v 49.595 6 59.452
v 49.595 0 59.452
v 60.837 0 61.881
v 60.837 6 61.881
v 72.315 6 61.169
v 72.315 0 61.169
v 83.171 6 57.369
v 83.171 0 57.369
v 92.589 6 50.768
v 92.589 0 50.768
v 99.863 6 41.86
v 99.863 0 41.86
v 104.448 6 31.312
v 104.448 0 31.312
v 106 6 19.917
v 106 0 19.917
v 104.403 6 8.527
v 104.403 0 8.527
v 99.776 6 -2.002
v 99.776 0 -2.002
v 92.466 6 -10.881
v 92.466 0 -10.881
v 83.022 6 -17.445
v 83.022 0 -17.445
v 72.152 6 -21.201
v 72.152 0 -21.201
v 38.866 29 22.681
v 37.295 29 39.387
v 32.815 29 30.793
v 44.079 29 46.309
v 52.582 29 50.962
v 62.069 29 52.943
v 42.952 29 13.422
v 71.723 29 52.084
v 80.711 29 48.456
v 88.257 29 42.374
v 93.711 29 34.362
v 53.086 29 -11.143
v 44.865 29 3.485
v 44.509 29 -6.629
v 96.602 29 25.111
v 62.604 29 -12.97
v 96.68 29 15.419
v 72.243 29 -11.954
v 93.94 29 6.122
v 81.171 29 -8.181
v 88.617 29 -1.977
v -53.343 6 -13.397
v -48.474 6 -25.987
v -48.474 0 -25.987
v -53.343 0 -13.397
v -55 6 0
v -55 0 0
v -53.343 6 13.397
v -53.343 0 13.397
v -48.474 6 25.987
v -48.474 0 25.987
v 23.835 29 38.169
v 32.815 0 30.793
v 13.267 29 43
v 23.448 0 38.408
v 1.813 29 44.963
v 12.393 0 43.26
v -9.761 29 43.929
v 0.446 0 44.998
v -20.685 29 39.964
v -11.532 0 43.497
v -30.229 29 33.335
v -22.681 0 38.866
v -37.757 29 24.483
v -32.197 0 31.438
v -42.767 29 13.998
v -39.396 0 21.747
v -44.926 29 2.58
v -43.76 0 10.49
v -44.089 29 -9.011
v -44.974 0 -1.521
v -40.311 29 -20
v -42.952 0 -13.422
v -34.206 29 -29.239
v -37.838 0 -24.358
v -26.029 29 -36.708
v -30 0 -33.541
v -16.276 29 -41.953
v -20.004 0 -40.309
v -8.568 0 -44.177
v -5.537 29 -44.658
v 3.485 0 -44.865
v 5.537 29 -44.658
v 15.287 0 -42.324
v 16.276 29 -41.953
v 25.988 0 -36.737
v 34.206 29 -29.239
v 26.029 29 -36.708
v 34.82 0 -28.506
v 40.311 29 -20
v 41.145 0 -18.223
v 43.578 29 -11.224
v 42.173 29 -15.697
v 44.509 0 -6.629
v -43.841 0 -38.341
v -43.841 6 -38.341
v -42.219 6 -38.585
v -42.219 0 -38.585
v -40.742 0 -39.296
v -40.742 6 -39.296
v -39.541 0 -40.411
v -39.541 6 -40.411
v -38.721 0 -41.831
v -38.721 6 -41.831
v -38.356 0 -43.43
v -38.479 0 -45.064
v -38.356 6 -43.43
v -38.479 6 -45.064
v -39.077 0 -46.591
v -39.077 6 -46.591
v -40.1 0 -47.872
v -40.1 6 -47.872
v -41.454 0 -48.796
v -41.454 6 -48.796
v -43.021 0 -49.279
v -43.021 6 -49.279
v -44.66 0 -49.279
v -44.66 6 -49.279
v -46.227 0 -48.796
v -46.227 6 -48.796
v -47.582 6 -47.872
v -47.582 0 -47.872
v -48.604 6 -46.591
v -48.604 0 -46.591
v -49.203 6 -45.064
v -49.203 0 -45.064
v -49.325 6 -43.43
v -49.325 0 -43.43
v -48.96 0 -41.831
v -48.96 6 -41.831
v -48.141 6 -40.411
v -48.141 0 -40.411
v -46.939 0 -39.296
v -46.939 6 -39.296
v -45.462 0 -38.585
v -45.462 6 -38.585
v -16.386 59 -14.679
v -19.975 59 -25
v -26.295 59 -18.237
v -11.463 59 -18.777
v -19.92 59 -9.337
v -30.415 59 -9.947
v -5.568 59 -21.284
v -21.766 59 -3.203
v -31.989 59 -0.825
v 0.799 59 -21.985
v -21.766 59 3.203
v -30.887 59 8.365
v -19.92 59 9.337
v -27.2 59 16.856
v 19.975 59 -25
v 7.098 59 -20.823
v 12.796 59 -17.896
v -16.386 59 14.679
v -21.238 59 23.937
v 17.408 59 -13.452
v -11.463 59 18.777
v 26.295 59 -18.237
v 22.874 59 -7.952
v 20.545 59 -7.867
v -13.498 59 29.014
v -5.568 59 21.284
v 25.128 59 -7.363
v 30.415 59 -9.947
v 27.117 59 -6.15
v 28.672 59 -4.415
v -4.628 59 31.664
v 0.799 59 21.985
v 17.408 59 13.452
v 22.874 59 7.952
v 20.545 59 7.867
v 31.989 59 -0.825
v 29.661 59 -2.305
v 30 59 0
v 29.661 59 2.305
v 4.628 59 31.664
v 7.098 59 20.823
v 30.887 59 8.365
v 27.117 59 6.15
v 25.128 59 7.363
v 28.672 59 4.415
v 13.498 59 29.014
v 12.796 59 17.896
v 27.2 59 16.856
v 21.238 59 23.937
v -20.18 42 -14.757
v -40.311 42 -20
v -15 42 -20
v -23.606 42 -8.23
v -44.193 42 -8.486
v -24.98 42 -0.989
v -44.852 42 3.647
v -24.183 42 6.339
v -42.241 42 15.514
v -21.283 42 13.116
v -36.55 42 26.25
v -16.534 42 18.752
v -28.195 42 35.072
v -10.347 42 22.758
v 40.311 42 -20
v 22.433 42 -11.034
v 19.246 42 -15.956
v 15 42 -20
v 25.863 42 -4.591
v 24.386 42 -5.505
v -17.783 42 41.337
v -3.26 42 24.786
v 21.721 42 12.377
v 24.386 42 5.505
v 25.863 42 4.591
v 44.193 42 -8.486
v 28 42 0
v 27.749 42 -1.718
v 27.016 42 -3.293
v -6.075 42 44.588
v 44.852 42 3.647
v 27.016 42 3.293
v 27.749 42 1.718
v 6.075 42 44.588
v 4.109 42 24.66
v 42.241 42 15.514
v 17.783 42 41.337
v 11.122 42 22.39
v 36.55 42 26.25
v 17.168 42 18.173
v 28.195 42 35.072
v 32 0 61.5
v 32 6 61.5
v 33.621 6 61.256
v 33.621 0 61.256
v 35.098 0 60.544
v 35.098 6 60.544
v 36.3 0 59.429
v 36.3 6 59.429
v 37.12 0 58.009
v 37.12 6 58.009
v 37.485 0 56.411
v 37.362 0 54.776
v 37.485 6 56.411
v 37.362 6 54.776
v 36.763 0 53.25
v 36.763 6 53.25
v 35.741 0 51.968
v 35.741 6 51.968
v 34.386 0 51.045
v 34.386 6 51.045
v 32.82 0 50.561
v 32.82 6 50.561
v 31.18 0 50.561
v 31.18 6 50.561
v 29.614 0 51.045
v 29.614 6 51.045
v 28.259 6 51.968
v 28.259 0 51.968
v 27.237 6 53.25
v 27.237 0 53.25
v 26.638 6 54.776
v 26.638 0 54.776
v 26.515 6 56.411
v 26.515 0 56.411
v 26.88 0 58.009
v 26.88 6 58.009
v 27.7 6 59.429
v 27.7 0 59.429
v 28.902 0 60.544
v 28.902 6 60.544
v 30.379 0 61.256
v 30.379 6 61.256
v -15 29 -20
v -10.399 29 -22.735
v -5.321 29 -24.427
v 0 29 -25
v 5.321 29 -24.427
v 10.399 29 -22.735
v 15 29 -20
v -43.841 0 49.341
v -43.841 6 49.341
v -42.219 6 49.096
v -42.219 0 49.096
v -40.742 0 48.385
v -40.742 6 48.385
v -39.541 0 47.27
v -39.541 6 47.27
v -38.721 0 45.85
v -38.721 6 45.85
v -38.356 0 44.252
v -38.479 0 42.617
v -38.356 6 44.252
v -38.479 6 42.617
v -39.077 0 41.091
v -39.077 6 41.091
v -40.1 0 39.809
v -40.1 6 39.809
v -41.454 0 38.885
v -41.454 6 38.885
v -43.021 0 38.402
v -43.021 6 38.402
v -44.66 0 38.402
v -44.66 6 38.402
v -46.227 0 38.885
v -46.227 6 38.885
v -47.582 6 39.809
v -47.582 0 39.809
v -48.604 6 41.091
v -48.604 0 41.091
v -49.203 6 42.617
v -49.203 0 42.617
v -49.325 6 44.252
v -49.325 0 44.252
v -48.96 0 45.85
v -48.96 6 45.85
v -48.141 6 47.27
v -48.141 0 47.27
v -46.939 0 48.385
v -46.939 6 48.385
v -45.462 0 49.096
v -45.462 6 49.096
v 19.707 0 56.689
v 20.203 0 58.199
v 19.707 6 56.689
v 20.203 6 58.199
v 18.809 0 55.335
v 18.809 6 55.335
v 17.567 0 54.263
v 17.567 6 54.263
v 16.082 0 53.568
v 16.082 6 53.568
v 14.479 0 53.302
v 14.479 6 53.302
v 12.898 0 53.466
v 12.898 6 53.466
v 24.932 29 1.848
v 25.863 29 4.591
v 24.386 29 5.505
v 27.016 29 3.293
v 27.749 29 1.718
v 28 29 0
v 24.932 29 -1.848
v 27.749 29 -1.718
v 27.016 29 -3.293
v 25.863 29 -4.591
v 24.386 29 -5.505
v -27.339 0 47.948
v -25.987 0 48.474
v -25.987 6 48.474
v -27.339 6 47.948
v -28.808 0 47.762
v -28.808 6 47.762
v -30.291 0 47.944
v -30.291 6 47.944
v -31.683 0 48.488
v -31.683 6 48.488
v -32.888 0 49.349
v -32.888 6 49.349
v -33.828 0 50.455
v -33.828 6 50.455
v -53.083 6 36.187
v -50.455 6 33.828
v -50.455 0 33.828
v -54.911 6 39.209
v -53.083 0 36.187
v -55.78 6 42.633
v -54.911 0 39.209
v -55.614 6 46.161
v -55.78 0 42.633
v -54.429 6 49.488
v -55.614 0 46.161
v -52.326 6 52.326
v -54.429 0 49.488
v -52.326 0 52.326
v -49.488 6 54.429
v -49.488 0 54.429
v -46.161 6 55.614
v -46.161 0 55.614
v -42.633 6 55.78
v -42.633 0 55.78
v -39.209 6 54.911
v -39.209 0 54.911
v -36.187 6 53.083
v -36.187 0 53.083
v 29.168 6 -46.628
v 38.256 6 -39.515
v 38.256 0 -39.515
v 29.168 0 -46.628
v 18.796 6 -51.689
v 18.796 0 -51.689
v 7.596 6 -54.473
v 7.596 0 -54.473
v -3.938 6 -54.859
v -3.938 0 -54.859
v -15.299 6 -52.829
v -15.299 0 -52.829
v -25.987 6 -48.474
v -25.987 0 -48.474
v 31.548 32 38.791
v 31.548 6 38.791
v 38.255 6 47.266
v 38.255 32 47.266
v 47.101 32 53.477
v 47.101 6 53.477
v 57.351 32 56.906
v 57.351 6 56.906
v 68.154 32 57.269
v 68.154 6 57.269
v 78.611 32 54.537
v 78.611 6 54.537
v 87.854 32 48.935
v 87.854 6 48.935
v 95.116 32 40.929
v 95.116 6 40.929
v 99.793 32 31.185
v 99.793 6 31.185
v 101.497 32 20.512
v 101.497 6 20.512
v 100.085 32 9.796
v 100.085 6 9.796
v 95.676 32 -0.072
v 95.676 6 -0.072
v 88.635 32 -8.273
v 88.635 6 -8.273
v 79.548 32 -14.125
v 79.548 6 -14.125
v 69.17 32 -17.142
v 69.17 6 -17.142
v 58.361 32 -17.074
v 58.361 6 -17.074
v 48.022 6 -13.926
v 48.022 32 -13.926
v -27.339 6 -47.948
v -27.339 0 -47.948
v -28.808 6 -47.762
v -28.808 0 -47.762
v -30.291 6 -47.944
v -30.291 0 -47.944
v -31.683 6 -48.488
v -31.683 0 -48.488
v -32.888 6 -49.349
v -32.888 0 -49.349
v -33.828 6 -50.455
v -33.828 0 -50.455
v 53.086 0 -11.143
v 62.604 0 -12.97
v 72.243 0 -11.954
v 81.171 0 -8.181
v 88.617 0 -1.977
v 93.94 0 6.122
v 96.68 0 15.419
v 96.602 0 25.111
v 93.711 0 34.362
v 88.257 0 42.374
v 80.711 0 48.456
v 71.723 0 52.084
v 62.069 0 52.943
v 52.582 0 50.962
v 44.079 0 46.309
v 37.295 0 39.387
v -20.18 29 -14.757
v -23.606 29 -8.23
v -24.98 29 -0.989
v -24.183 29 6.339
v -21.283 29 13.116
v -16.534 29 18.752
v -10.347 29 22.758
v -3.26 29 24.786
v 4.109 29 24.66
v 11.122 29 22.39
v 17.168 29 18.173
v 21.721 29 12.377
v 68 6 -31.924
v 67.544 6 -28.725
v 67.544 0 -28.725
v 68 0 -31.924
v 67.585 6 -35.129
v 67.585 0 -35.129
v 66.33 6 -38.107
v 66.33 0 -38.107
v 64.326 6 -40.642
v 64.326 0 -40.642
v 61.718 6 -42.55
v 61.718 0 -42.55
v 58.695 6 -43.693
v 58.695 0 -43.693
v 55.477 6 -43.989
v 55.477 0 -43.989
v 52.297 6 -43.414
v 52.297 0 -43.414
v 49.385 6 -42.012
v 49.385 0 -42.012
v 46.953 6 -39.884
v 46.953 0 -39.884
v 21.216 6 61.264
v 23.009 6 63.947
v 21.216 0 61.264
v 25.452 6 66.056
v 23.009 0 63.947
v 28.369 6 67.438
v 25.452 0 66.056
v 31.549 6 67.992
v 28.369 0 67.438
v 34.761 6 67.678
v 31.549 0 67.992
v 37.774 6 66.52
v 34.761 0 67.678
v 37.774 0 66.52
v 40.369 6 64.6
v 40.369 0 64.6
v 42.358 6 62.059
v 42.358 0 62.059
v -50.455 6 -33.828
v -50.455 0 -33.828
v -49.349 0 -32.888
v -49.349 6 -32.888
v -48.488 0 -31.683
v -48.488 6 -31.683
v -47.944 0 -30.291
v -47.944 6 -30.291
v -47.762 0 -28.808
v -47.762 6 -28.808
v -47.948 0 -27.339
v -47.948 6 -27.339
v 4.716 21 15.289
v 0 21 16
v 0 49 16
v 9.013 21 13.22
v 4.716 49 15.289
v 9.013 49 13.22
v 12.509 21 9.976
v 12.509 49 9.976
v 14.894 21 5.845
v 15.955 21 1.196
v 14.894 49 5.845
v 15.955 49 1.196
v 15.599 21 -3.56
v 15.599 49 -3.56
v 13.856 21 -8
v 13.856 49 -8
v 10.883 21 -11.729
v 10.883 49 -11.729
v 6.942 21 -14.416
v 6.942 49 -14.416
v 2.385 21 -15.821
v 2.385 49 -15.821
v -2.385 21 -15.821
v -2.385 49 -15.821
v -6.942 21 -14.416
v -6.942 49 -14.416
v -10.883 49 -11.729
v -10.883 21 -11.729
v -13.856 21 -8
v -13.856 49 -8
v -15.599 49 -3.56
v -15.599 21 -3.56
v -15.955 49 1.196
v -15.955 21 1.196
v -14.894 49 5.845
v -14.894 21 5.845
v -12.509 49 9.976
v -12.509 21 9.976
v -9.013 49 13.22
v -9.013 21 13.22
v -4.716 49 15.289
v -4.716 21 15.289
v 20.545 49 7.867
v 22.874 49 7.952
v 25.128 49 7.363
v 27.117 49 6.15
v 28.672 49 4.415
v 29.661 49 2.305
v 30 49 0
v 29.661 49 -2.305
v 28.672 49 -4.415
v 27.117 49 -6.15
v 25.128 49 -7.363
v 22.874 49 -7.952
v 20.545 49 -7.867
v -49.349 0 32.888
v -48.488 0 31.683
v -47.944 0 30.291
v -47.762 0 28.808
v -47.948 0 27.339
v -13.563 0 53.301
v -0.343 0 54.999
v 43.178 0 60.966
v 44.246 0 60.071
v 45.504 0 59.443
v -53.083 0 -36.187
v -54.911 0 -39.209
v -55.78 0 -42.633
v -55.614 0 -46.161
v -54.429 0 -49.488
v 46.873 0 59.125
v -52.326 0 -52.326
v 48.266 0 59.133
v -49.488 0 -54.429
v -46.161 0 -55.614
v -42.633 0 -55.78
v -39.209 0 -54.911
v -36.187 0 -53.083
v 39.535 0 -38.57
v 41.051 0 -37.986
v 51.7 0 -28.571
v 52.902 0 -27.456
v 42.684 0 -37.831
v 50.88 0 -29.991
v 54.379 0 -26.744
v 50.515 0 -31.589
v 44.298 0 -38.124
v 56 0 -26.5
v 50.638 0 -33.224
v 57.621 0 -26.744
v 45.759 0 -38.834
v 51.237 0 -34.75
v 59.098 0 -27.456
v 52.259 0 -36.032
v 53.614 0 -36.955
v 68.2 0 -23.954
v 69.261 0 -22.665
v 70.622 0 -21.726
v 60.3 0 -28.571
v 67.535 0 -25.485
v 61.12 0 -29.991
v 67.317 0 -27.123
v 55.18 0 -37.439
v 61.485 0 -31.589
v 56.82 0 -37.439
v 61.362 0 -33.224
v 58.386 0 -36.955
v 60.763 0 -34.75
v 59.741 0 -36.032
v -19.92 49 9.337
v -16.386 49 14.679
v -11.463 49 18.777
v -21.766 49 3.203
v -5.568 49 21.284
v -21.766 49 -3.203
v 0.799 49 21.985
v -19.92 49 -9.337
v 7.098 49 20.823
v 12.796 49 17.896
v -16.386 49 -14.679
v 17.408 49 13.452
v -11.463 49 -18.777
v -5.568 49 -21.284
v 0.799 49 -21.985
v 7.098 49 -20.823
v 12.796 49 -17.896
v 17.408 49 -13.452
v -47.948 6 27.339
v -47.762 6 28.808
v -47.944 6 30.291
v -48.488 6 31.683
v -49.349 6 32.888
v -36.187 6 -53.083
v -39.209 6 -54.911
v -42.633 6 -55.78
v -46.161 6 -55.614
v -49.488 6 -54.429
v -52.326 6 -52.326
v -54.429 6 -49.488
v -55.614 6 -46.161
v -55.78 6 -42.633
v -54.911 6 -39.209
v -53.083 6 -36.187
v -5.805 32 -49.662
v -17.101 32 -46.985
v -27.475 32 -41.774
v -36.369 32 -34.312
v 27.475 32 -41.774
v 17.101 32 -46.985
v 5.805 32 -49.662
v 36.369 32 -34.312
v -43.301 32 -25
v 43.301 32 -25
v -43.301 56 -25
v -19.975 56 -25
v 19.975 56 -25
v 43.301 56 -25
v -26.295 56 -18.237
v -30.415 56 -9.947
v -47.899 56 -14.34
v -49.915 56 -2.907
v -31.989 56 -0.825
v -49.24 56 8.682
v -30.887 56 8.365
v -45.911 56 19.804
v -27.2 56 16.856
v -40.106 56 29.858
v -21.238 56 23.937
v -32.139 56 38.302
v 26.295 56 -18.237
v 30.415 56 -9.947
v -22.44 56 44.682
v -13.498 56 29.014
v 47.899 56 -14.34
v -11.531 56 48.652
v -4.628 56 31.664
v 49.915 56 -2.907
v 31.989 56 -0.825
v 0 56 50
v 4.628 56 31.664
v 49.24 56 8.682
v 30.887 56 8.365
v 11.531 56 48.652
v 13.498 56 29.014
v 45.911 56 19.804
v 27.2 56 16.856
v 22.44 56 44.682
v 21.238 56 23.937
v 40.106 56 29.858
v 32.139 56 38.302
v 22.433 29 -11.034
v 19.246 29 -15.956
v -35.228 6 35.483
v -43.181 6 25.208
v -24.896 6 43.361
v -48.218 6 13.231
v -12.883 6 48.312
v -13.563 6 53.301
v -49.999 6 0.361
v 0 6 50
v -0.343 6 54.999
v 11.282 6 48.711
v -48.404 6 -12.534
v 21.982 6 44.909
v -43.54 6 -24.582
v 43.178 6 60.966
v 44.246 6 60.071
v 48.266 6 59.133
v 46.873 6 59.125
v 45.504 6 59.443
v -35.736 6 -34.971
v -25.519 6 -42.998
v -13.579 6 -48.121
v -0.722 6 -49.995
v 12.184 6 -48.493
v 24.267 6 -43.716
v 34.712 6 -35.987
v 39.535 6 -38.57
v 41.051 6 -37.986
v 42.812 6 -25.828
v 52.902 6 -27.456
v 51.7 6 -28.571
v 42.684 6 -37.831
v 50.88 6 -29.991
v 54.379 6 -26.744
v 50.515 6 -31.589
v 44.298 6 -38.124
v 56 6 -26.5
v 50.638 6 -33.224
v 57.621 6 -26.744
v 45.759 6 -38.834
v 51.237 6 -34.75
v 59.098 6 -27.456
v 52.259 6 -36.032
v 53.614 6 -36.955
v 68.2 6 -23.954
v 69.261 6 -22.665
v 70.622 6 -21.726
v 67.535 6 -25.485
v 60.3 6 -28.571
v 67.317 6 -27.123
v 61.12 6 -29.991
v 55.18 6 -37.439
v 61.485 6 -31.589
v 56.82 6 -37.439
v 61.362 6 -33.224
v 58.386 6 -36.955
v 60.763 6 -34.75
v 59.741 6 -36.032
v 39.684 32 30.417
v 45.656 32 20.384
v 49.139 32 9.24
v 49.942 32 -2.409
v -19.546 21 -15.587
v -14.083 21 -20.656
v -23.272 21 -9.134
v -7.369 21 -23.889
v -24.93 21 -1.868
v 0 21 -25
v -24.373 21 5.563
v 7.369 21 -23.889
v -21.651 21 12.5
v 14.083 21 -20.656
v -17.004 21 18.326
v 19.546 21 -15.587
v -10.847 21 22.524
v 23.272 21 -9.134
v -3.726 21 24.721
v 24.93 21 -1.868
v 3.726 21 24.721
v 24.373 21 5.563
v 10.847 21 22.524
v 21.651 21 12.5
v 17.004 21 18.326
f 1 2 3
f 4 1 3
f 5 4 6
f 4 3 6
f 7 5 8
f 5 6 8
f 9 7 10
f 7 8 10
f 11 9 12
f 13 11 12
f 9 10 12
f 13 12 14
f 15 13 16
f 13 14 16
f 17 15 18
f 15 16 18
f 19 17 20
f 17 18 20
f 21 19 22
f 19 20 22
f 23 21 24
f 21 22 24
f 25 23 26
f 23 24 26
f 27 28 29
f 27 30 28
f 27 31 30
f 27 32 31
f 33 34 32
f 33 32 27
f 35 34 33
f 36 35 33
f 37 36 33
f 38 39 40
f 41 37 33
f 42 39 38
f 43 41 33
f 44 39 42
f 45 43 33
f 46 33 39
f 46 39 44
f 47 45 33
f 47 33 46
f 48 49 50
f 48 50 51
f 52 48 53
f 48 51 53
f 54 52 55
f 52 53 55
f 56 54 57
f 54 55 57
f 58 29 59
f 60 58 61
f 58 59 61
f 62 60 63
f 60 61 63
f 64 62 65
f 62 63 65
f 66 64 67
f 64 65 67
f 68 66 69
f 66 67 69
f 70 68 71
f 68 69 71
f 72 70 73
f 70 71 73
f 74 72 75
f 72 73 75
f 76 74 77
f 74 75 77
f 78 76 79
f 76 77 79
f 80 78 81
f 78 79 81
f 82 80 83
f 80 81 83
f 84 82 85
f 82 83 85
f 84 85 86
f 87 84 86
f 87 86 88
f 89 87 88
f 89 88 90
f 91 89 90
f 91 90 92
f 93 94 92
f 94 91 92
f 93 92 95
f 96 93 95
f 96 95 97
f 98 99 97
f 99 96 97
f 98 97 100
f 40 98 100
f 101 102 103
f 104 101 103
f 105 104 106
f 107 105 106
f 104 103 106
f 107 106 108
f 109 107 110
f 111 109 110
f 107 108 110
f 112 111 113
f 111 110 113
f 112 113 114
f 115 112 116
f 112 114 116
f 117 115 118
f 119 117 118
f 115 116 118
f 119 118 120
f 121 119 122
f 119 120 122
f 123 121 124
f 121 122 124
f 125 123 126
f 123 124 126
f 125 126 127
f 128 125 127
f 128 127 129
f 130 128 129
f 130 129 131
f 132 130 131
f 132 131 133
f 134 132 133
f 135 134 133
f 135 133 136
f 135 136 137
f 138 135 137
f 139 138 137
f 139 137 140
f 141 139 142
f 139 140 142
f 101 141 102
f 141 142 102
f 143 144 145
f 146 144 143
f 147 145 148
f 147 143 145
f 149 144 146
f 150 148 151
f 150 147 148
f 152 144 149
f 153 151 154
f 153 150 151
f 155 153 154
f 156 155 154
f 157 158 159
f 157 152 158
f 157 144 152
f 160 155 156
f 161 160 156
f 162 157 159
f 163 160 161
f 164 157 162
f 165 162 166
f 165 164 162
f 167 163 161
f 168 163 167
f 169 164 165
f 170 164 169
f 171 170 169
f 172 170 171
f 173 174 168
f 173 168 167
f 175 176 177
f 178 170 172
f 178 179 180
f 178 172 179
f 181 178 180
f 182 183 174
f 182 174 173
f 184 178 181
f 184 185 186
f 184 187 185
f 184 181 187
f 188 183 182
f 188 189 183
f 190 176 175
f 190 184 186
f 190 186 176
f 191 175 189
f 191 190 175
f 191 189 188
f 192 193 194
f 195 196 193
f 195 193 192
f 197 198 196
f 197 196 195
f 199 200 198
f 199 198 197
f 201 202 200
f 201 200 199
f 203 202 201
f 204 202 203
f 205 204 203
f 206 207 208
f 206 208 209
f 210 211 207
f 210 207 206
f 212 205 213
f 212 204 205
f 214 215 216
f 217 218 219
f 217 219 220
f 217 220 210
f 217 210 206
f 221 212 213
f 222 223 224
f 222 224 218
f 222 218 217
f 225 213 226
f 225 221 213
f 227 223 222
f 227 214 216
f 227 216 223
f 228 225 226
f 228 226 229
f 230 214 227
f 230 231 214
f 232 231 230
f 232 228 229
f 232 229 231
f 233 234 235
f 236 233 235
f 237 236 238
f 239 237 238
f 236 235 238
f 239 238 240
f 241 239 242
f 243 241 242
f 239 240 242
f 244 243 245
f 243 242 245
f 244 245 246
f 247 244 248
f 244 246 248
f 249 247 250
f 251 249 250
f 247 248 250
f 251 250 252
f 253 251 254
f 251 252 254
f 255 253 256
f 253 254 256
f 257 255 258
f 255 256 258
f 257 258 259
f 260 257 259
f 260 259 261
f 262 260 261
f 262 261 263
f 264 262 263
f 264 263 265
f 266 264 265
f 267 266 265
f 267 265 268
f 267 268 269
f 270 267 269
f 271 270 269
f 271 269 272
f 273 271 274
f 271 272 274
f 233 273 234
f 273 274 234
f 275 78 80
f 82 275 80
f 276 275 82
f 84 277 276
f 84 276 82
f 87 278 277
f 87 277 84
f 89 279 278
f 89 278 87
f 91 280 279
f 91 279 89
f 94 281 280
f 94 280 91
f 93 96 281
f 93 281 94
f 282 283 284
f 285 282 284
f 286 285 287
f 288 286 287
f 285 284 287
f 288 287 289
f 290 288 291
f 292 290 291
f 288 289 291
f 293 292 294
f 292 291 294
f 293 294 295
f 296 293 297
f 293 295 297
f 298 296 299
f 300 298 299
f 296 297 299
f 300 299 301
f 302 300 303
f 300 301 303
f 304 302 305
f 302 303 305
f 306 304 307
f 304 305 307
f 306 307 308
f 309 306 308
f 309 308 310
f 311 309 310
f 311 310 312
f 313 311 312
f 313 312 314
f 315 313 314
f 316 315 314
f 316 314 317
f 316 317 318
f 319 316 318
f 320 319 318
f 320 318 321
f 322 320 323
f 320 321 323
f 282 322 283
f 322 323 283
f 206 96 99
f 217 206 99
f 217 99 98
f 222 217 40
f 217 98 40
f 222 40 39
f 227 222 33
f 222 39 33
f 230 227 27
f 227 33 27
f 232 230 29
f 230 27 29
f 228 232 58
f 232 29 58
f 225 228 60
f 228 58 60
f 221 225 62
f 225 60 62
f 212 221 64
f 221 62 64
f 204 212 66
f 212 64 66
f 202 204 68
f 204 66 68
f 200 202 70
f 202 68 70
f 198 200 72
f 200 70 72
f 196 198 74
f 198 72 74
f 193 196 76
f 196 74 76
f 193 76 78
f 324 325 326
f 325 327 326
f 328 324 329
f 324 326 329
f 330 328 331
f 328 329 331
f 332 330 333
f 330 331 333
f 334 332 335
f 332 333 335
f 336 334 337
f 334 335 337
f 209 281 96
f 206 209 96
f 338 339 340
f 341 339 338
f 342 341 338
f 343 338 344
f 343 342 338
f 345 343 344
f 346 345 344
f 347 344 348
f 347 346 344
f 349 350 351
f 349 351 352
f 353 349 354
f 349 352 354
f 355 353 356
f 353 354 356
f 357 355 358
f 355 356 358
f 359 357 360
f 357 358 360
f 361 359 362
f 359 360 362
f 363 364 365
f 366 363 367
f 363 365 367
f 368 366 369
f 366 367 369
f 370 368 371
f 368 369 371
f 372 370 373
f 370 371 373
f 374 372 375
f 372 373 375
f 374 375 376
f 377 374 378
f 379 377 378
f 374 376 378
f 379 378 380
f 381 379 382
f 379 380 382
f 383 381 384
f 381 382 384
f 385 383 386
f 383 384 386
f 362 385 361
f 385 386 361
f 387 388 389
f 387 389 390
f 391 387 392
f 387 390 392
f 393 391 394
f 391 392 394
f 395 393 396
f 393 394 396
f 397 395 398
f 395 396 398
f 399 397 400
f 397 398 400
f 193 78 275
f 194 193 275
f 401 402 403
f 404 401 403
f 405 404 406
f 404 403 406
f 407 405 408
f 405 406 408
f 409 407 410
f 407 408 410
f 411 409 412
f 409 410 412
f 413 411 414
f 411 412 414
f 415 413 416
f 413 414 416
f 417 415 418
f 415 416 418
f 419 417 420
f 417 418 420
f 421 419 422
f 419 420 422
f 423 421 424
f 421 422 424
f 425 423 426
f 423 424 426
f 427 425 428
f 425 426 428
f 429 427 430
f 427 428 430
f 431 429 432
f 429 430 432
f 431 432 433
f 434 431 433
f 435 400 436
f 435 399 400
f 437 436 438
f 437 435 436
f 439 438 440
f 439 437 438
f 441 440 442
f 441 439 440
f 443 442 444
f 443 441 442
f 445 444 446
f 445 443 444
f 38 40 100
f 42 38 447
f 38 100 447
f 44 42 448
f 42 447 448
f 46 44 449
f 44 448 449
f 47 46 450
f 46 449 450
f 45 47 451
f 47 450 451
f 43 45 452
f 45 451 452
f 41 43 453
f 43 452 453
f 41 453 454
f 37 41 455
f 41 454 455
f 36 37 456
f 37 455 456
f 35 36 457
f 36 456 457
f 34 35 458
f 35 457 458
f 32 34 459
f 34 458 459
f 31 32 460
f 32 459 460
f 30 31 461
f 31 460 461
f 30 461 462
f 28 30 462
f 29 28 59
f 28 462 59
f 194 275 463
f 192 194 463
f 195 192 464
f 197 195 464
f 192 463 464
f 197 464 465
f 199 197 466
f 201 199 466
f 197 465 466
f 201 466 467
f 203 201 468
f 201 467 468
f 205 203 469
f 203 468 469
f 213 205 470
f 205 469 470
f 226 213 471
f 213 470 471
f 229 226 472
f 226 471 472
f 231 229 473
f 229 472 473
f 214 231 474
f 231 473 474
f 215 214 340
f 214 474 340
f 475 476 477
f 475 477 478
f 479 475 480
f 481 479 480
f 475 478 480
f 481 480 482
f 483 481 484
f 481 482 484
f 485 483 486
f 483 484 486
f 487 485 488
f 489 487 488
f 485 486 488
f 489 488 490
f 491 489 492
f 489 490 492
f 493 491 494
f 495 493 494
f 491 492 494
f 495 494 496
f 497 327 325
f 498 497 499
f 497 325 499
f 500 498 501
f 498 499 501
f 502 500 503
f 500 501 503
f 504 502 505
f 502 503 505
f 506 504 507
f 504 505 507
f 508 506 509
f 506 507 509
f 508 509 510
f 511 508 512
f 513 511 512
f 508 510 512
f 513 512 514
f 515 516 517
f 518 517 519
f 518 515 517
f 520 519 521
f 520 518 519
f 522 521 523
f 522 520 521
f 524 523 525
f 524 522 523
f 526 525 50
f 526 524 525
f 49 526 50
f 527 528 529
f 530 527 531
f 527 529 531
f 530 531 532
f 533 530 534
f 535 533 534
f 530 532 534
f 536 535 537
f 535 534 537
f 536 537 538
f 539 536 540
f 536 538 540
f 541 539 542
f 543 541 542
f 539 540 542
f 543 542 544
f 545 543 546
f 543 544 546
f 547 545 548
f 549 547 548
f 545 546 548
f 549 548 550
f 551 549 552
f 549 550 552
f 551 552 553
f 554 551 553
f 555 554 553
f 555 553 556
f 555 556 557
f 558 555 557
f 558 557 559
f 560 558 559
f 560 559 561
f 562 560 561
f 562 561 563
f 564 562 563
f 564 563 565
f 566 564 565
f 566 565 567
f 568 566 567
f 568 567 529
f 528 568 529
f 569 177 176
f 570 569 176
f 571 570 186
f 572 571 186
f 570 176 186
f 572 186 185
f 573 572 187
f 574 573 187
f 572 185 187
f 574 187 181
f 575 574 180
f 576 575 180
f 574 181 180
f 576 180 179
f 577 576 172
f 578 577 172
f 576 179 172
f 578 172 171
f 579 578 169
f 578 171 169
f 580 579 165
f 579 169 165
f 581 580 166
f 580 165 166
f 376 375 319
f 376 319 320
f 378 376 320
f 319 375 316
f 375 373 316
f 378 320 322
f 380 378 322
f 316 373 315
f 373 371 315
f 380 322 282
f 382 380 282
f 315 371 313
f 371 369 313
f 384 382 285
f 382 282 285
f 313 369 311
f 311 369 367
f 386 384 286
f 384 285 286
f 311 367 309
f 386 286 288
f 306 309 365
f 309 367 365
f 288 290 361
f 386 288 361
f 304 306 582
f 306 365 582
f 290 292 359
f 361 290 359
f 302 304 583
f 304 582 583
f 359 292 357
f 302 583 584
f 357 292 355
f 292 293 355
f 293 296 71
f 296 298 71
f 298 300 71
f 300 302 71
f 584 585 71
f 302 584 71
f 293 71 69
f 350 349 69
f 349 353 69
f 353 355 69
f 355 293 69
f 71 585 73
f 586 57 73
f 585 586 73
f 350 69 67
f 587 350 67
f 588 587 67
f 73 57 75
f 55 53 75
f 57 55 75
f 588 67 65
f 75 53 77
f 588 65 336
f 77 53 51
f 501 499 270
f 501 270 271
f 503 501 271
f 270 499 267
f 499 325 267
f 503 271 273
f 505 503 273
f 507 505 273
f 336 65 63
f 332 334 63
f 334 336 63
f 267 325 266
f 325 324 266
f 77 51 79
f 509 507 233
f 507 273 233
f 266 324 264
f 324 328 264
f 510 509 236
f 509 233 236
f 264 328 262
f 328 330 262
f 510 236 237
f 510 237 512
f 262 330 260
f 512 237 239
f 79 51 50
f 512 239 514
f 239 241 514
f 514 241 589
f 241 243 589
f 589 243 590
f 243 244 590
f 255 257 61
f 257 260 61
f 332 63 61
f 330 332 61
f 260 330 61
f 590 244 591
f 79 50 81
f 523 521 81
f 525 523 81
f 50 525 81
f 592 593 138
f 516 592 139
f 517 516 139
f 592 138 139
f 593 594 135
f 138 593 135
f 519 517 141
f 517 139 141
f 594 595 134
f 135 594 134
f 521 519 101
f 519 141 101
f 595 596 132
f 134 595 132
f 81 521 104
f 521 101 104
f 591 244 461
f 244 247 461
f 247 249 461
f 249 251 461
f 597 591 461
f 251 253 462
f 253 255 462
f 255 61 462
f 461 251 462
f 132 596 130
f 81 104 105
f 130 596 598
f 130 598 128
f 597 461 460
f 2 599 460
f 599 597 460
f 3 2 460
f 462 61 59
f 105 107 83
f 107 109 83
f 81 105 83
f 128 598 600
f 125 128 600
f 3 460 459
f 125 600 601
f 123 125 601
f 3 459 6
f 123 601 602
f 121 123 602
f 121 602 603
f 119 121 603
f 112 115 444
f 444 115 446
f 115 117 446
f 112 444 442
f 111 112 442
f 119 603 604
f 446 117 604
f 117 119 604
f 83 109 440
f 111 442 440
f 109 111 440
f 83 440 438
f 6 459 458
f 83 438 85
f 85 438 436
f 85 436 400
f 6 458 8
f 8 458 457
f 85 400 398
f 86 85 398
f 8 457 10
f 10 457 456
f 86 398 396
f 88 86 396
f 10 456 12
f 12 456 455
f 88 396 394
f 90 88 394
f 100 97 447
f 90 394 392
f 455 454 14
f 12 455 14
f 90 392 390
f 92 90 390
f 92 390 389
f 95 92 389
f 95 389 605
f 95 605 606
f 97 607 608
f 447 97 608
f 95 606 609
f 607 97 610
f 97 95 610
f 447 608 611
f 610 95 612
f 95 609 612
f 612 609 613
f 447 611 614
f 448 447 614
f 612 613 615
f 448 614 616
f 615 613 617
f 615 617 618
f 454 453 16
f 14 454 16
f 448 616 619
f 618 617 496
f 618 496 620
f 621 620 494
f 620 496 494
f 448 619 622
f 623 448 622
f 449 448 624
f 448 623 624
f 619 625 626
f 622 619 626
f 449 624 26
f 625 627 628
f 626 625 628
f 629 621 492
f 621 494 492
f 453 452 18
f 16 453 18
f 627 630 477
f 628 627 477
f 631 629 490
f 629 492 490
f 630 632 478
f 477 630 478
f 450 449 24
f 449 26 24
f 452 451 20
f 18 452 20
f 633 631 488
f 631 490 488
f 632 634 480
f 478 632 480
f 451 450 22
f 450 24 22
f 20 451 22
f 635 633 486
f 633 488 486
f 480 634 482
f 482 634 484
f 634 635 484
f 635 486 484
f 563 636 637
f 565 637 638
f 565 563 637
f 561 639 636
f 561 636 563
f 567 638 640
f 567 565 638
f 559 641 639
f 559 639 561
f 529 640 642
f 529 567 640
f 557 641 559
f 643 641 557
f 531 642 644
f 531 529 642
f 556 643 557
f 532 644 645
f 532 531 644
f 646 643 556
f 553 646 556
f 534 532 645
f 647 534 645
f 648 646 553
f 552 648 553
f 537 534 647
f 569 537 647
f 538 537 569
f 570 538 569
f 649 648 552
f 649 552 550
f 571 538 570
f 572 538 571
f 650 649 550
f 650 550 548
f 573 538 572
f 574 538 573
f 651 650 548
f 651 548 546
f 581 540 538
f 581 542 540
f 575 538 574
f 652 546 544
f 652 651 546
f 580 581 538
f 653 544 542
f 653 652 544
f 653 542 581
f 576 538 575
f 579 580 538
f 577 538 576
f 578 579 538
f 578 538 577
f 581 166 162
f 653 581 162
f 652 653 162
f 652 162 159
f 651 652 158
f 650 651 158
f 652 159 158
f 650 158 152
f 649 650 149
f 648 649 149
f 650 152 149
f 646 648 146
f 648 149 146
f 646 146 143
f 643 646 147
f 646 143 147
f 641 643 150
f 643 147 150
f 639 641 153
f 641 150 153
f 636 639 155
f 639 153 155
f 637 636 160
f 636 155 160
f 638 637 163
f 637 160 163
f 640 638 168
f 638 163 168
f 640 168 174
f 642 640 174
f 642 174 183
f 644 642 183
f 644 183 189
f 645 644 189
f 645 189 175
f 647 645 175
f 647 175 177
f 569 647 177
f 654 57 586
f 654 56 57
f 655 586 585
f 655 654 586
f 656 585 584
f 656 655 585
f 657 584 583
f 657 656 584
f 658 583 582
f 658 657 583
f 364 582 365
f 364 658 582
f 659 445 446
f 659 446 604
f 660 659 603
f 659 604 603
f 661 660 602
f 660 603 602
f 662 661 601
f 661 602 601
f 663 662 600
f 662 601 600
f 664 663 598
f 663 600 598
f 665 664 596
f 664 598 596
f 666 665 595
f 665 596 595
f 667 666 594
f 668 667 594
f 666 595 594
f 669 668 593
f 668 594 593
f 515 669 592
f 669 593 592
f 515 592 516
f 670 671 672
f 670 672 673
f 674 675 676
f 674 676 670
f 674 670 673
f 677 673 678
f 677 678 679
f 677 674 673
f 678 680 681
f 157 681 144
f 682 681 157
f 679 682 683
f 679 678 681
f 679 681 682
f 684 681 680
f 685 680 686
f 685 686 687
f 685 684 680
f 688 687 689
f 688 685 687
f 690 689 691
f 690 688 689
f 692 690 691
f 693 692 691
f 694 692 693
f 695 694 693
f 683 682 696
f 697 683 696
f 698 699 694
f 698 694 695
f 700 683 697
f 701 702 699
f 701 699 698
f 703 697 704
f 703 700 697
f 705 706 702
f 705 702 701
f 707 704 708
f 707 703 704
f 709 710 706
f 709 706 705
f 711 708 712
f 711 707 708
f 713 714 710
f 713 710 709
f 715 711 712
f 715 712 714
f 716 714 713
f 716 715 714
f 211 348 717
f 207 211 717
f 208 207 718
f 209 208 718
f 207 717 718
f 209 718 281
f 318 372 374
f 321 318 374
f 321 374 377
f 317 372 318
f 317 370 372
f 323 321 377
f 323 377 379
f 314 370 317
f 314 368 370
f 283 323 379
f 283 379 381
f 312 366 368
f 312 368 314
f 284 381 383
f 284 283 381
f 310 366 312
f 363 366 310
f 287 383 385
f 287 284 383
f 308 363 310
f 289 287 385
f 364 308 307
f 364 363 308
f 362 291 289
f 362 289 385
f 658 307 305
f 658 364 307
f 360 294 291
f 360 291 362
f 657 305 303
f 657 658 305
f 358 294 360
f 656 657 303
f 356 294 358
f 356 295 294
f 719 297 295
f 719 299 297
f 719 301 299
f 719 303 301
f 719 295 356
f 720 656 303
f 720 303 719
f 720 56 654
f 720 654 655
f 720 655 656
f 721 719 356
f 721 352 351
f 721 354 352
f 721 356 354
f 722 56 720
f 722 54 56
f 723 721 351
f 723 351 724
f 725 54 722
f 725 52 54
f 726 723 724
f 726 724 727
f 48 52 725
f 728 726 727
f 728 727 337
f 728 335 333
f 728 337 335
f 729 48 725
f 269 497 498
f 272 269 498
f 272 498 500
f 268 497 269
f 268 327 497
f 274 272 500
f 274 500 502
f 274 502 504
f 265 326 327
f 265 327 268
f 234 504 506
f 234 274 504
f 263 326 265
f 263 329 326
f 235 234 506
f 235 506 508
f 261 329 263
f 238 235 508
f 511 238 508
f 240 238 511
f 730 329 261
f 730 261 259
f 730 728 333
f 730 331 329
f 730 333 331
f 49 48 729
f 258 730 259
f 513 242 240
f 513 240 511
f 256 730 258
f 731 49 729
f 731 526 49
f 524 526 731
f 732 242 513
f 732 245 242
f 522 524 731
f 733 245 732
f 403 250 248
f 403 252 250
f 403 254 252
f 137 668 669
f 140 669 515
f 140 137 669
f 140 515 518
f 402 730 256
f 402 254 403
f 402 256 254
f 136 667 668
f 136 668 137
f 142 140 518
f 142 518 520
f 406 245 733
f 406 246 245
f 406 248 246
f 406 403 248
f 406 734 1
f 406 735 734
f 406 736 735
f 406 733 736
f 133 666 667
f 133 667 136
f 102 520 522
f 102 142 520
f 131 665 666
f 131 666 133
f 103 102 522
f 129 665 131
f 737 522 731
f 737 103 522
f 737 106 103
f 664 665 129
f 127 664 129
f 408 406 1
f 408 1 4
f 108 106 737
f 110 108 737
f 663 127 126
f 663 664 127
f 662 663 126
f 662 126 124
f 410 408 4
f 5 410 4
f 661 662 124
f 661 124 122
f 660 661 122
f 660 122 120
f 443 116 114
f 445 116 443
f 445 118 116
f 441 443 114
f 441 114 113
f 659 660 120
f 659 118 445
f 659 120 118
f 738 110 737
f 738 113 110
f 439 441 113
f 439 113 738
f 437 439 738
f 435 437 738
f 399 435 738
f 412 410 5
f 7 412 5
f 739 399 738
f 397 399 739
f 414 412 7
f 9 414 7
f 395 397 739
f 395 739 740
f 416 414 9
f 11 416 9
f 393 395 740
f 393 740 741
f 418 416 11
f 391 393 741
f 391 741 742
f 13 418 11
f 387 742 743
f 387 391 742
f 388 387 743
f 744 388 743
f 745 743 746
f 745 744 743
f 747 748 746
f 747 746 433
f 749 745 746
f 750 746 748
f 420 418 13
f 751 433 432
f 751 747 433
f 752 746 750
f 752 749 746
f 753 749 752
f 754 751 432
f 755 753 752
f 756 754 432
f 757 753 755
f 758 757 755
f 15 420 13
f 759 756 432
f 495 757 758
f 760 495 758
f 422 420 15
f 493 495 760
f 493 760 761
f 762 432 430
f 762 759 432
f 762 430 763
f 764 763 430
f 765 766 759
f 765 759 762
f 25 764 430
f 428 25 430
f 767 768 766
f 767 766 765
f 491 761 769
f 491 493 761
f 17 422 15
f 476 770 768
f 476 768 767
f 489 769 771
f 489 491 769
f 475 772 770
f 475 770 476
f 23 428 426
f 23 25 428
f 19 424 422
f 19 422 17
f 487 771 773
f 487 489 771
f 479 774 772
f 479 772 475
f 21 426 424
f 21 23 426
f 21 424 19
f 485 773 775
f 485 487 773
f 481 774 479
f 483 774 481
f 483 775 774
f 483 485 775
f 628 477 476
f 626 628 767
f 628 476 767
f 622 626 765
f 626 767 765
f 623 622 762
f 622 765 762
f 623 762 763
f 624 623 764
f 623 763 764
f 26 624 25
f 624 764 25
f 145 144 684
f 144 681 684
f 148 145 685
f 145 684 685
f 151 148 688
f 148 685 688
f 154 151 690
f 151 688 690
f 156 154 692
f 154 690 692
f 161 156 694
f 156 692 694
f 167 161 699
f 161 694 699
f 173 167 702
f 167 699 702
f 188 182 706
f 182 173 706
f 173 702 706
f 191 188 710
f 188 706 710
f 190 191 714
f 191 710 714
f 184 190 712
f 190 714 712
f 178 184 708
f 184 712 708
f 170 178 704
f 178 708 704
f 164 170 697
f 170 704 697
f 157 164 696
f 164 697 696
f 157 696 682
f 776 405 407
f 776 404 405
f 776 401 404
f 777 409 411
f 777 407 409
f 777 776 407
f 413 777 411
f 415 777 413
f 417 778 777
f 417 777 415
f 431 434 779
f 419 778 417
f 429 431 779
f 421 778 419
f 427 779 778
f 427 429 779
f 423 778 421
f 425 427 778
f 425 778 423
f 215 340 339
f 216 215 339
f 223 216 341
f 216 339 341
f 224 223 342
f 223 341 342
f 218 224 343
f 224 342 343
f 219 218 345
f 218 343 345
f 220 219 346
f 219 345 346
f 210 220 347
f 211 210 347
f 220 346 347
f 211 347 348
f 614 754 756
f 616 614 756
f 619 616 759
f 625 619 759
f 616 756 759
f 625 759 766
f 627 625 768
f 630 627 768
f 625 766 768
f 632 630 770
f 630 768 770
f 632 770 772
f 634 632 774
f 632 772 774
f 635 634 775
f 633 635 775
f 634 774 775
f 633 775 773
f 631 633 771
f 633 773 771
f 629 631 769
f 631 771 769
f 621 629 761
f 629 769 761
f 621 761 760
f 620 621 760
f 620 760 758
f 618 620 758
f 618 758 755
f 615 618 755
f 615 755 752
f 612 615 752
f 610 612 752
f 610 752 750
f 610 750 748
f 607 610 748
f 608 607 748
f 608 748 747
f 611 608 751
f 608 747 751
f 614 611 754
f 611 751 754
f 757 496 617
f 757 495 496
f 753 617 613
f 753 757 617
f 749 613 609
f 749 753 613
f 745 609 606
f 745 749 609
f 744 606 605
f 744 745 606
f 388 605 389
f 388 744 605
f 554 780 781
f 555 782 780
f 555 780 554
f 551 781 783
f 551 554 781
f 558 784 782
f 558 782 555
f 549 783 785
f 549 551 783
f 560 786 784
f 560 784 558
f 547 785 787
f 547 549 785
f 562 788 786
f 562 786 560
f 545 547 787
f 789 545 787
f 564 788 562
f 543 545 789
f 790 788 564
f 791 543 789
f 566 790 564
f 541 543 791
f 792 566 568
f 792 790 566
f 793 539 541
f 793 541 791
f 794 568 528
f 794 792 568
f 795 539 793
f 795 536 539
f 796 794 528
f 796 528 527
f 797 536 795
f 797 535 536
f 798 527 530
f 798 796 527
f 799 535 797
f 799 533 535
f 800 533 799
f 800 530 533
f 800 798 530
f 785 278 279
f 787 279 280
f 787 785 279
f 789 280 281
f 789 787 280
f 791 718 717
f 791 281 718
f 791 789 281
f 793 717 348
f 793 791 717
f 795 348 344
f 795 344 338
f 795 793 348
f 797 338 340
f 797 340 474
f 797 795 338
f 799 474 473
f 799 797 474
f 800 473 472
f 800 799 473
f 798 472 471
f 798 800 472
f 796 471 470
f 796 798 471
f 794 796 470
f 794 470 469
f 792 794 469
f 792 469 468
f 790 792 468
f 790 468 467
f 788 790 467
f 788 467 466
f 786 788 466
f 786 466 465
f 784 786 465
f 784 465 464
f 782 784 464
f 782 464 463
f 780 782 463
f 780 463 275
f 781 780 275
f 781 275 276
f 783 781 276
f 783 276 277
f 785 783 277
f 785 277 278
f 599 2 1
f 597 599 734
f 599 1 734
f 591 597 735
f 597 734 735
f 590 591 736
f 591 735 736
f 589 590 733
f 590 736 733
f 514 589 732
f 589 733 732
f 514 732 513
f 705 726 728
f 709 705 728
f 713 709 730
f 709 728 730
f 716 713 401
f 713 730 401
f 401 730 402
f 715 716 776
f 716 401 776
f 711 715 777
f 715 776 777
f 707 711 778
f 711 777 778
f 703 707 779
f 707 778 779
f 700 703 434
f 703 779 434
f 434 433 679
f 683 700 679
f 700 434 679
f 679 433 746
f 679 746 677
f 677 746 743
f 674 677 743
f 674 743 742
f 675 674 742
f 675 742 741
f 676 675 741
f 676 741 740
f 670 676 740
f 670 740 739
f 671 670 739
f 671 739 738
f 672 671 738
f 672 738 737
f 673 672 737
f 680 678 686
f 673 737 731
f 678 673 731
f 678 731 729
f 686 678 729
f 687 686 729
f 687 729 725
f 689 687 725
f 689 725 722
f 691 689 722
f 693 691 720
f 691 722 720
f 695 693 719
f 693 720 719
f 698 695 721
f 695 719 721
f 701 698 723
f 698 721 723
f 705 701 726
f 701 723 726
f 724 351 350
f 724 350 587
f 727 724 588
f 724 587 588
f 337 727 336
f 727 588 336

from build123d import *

# Parameters (mm, degrees)
BOSS_EXTRUDE1_DEPTH = 6
SKETCH2_R           = 5.5
CUT_EXTRUDE1_DEPTH  = 6
SKETCH3_R           = 50
BOSS_EXTRUDE2_DEPTH = 50
SKETCH4_R           = 37.5
BOSS_EXTRUDE3_DEPTH = 26
SKETCH5_R           = 32
BOSS_EXTRUDE4_DEPTH = 3
FILLET2_R           = 6
FILLET3_R           = 6
CUT_EXTRUDE2_START  = -27
CUT_EXTRUDE2_DEPTH  = 27
CUT_EXTRUDE3_DEPTH  = 10
SKETCH12_R          = 33
CUT_EXTRUDE9_DEPTH  = 29
SKETCH21_R          = 16
CUT_EXTRUDE16_DEPTH = 35
SKETCH22_R          = 45
CUT_EXTRUDE18_DEPTH = 21
SKETCH34_R          = 45
SKETCH34_R_2        = 25
CUT_EXTRUDE25_DEPTH = 8
CUT_EXTRUDE26_DEPTH = 13


with BuildPart() as part:
    # Sketch1 → Boss-Extrude1 (new body)
    with BuildSketch(Plane(origin=(0, 0, 0), x_dir=(1, 0, 0), z_dir=(0, 1, 0))):
        with BuildLine():
            ThreePointArc((21.211789327, -50.745048956), (28.860136885, -67.581936782), (43.965179902, -56.913493246))
            ThreePointArc((43.965179902, -56.913493246), (104.875389558, -29.654145663), (62.597817721, 21.976587342))
            ThreePointArc((62.597817721, 21.976587342), (62.107138398, 42.329707672), (44.037643352, 32.949749135))
            ThreePointArc((44.037643352, 32.949749135), (8.49481412, 54.340023308), (-31.880473469, 44.817802394))
            ThreePointArc((-31.880473469, 44.817802394), (-52.325901808, 52.325901808), (-44.817802394, 31.880473469))
            ThreePointArc((-44.817802394, 31.880473469), (-55, 0), (-44.817802394, -31.880473469))
            ThreePointArc((-44.817802394, -31.880473469), (-52.325901808, -52.325901808), (-31.880473469, -44.817802394))
            ThreePointArc((-31.880473469, -44.817802394), (-6.102316632, -54.660421986), (21.211789327, -50.745048956))
        make_face()
    extrude(amount=BOSS_EXTRUDE1_DEPTH)

    # Sketch2 → Cut-Extrude1 (cut)
    with BuildSketch(Plane(origin=(0, 6, 0), x_dir=(1, 0, 0), z_dir=(0, 1, 0))):
        with Locations(Location((56, 32, 0), (0, 0, 270))):
            Circle(SKETCH2_R)
        with Locations(Location((-43.840620434, 43.840620434, 0), (0, 0, 270))):
            Circle(SKETCH2_R)
        with Locations(Location((-43.840620434, -43.840620434, 0), (0, 0, 270))):
            Circle(SKETCH2_R)
        with Locations(Location((32, -56, 0), (0, 0, 270))):
            Circle(SKETCH2_R)
    extrude(amount=-CUT_EXTRUDE1_DEPTH, mode=Mode.SUBTRACT)

    # Sketch3 → Boss-Extrude2 (add)
    with BuildSketch(Plane(origin=(0, 6, 0), x_dir=(1, 0, 0), z_dir=(0, 1, 0))):
        with Locations(Location((0, 0, 0), (0, 0, 270))):
            Circle(SKETCH3_R)
    extrude(amount=BOSS_EXTRUDE2_DEPTH)

    # Sketch4 → Boss-Extrude3 (add)
    with BuildSketch(Plane(origin=(0, 6, 0), x_dir=(1, 0, 0), z_dir=(0, 1, 0))):
        with Locations((64, -20)):
            Circle(SKETCH4_R)
    extrude(amount=BOSS_EXTRUDE3_DEPTH)

    # Sketch5 → Boss-Extrude4 (add)
    with BuildSketch(Plane(origin=(0, 56, 0), x_dir=(1, 0, 0), z_dir=(0, 1, 0))):
        with Locations(Location((0, 0, 0), (0, 0, 270))):
            Circle(SKETCH5_R)
    extrude(amount=BOSS_EXTRUDE4_DEPTH)

    # Fillet2
    fillet2_edges = [part.edges().sort_by_distance(p)[0] for p in [
        (44.037643352, 3, -32.949749135),
    ]]
    fillet(fillet2_edges, radius=FILLET2_R)

    # Fillet3
    fillet3_edges = [part.edges().sort_by_distance(p)[0] for p in [
        (21.211789327, 3, 50.745048956),
        (-31.880473469, 3, 44.817802394),
        (-44.817802394, 3, 31.880473469),
        (-44.817802394, 3, -31.880473469),
        (-31.880473469, 3, -44.817802394),
        (62.597817721, 3, -21.976587342),
        (43.965179902, 3, 56.913493246),
    ]]
    fillet(fillet3_edges, radius=FILLET3_R)

    # Sketch6 → Cut-Extrude2 (cut)
    with BuildSketch(Plane(origin=(0, 59, 0), x_dir=(1, 0, 0), z_dir=(0, 1, 0)).offset(CUT_EXTRUDE2_START)):
        with BuildLine():
            Line((0, 25), (43.301270189, 25))
            ThreePointArc((43.301270189, 25), (0, 50), (-43.301270189, 25))
            Line((-43.301270189, 25), (0, 25))
        make_face()
    extrude(amount=CUT_EXTRUDE2_DEPTH, mode=Mode.SUBTRACT)

    # Sketch7 → Cut-Extrude3 (cut)
    with BuildSketch(Plane(origin=(0, 59, 0), x_dir=(1, 0, 0), z_dir=(0, 1, 0))):
        with BuildLine():
            ThreePointArc((20.545454545, 7.866657328), (-22, 0), (20.545454545, -7.866657328))
            ThreePointArc((20.545454545, -7.866657328), (30, 0), (20.545454545, 7.866657328))
        make_face()
    extrude(amount=-CUT_EXTRUDE3_DEPTH, mode=Mode.SUBTRACT)

    # Sketch12 → Cut-Extrude9 (cut)
    with BuildSketch(Plane.XZ):
        with Locations(Location((64, 20, 0), (0, 0, 270))):
            Circle(SKETCH12_R)
    extrude(amount=-CUT_EXTRUDE9_DEPTH, mode=Mode.SUBTRACT)

    # Sketch21 → Cut-Extrude16 (cut)
    with BuildSketch(Plane(origin=(0, 56, 0), x_dir=(1, 0, 0), z_dir=(0, 1, 0))):
        with Locations(Location((0, 0, 0), (0, 0, 270))):
            Circle(SKETCH21_R)
    extrude(amount=-CUT_EXTRUDE16_DEPTH, mode=Mode.SUBTRACT)

    # Sketch22 → Cut-Extrude18 (cut)
    with BuildSketch(Plane.XZ):
        Circle(SKETCH22_R)
    extrude(amount=-CUT_EXTRUDE18_DEPTH, mode=Mode.SUBTRACT)

    # Sketch34 → Cut-Extrude25 (cut)
    with BuildSketch(Plane(origin=(0, 21, 0), x_dir=(-1, 0, 0), z_dir=(0, -1, 0))):
        Circle(SKETCH34_R)
        with Locations(Location((0, 0, 0), (0, 0, 90))):
            Circle(SKETCH34_R_2, mode=Mode.SUBTRACT)
    extrude(amount=-CUT_EXTRUDE25_DEPTH, mode=Mode.SUBTRACT)

    # Sketch35 → Cut-Extrude26 (cut)
    with BuildSketch(Plane.XZ.offset(-29)):
        with BuildLine():
            Line((15, -20), (40.311288741, -20))
            ThreePointArc((40.311288741, -20), (0, 45), (-40.311288741, -20))
            Line((-40.311288741, -20), (-15, -20))
            ThreePointArc((-15, -20), (-13.588689929, 20.984458678), (24.386363636, 5.505022125))
            ThreePointArc((24.386363636, 5.505022125), (28, 0), (24.386363636, -5.505022125))
            ThreePointArc((24.386363636, -5.505022125), (20.984458678, -13.588689929), (15, -20))
        make_face()
    extrude(amount=-CUT_EXTRUDE26_DEPTH, mode=Mode.SUBTRACT)


solid = part.part
